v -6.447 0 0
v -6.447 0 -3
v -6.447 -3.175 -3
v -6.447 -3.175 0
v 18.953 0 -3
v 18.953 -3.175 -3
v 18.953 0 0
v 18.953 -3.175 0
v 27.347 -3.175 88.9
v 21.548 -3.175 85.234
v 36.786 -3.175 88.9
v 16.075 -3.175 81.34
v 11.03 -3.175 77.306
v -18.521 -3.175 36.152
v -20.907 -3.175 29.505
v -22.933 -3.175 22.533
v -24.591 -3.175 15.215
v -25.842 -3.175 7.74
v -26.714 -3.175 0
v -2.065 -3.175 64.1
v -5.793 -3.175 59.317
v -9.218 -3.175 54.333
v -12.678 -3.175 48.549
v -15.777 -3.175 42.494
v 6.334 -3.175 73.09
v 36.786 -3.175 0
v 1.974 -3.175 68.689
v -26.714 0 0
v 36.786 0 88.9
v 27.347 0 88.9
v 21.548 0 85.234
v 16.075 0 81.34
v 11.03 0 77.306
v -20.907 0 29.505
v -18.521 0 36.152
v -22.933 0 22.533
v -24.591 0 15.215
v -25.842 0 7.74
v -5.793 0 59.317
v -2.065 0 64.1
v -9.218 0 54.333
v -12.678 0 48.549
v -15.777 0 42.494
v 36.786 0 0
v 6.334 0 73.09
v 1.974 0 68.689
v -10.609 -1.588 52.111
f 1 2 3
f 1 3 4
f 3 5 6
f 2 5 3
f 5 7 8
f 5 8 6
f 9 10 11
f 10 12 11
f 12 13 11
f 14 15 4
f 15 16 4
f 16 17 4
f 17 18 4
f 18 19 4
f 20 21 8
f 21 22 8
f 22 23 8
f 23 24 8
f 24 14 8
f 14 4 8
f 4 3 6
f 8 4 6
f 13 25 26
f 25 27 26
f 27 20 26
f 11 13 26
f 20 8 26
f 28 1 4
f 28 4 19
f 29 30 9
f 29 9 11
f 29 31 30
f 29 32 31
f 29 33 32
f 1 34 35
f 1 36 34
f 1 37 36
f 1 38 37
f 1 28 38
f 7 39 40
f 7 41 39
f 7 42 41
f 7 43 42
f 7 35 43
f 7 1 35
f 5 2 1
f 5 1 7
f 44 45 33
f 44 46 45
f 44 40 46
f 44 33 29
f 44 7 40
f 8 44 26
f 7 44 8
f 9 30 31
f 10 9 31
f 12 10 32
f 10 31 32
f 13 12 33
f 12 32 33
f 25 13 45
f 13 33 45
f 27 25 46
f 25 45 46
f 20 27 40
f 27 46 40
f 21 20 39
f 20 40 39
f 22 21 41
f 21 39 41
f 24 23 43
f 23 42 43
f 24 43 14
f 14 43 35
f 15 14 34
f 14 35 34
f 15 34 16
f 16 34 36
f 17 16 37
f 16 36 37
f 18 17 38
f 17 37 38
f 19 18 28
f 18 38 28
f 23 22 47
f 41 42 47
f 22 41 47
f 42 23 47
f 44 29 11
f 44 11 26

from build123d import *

# Parameters (mm, degrees)
BOSS_EXTRUDE1_DEPTH = 3.175


with BuildPart() as part:
    # Sketch1 → Boss-Extrude1 (new body)
    with BuildSketch(Plane(origin=(0, 0, 0), x_dir=(1, 0, 0), z_dir=(0, 1, 0))):
        with BuildLine():
            Line((36.786206897, 0), (18.953245729, 0))
            Line((18.953245729, 0), (18.953245729, 3))
            Line((18.953245729, 3), (-6.446754271, 3))
            Line((-6.446754271, 3), (-6.446754271, 0))
            Line((-6.446754271, 0), (-26.713793103, 0))
            add(Edge.make_bspline(
                [(27.346845479, -88.9), (-21.534982329, -59.771214116), (-26.713793103, 0)],
                knots=[0, 0, 0, 1, 1, 1], degree=2))
            Line((27.346845479, -88.9), (36.786206897, -88.9))
            Line((36.786206897, -88.9), (36.786206897, 0))
        make_face()
    extrude(amount=-BOSS_EXTRUDE1_DEPTH)


solid = part.part
